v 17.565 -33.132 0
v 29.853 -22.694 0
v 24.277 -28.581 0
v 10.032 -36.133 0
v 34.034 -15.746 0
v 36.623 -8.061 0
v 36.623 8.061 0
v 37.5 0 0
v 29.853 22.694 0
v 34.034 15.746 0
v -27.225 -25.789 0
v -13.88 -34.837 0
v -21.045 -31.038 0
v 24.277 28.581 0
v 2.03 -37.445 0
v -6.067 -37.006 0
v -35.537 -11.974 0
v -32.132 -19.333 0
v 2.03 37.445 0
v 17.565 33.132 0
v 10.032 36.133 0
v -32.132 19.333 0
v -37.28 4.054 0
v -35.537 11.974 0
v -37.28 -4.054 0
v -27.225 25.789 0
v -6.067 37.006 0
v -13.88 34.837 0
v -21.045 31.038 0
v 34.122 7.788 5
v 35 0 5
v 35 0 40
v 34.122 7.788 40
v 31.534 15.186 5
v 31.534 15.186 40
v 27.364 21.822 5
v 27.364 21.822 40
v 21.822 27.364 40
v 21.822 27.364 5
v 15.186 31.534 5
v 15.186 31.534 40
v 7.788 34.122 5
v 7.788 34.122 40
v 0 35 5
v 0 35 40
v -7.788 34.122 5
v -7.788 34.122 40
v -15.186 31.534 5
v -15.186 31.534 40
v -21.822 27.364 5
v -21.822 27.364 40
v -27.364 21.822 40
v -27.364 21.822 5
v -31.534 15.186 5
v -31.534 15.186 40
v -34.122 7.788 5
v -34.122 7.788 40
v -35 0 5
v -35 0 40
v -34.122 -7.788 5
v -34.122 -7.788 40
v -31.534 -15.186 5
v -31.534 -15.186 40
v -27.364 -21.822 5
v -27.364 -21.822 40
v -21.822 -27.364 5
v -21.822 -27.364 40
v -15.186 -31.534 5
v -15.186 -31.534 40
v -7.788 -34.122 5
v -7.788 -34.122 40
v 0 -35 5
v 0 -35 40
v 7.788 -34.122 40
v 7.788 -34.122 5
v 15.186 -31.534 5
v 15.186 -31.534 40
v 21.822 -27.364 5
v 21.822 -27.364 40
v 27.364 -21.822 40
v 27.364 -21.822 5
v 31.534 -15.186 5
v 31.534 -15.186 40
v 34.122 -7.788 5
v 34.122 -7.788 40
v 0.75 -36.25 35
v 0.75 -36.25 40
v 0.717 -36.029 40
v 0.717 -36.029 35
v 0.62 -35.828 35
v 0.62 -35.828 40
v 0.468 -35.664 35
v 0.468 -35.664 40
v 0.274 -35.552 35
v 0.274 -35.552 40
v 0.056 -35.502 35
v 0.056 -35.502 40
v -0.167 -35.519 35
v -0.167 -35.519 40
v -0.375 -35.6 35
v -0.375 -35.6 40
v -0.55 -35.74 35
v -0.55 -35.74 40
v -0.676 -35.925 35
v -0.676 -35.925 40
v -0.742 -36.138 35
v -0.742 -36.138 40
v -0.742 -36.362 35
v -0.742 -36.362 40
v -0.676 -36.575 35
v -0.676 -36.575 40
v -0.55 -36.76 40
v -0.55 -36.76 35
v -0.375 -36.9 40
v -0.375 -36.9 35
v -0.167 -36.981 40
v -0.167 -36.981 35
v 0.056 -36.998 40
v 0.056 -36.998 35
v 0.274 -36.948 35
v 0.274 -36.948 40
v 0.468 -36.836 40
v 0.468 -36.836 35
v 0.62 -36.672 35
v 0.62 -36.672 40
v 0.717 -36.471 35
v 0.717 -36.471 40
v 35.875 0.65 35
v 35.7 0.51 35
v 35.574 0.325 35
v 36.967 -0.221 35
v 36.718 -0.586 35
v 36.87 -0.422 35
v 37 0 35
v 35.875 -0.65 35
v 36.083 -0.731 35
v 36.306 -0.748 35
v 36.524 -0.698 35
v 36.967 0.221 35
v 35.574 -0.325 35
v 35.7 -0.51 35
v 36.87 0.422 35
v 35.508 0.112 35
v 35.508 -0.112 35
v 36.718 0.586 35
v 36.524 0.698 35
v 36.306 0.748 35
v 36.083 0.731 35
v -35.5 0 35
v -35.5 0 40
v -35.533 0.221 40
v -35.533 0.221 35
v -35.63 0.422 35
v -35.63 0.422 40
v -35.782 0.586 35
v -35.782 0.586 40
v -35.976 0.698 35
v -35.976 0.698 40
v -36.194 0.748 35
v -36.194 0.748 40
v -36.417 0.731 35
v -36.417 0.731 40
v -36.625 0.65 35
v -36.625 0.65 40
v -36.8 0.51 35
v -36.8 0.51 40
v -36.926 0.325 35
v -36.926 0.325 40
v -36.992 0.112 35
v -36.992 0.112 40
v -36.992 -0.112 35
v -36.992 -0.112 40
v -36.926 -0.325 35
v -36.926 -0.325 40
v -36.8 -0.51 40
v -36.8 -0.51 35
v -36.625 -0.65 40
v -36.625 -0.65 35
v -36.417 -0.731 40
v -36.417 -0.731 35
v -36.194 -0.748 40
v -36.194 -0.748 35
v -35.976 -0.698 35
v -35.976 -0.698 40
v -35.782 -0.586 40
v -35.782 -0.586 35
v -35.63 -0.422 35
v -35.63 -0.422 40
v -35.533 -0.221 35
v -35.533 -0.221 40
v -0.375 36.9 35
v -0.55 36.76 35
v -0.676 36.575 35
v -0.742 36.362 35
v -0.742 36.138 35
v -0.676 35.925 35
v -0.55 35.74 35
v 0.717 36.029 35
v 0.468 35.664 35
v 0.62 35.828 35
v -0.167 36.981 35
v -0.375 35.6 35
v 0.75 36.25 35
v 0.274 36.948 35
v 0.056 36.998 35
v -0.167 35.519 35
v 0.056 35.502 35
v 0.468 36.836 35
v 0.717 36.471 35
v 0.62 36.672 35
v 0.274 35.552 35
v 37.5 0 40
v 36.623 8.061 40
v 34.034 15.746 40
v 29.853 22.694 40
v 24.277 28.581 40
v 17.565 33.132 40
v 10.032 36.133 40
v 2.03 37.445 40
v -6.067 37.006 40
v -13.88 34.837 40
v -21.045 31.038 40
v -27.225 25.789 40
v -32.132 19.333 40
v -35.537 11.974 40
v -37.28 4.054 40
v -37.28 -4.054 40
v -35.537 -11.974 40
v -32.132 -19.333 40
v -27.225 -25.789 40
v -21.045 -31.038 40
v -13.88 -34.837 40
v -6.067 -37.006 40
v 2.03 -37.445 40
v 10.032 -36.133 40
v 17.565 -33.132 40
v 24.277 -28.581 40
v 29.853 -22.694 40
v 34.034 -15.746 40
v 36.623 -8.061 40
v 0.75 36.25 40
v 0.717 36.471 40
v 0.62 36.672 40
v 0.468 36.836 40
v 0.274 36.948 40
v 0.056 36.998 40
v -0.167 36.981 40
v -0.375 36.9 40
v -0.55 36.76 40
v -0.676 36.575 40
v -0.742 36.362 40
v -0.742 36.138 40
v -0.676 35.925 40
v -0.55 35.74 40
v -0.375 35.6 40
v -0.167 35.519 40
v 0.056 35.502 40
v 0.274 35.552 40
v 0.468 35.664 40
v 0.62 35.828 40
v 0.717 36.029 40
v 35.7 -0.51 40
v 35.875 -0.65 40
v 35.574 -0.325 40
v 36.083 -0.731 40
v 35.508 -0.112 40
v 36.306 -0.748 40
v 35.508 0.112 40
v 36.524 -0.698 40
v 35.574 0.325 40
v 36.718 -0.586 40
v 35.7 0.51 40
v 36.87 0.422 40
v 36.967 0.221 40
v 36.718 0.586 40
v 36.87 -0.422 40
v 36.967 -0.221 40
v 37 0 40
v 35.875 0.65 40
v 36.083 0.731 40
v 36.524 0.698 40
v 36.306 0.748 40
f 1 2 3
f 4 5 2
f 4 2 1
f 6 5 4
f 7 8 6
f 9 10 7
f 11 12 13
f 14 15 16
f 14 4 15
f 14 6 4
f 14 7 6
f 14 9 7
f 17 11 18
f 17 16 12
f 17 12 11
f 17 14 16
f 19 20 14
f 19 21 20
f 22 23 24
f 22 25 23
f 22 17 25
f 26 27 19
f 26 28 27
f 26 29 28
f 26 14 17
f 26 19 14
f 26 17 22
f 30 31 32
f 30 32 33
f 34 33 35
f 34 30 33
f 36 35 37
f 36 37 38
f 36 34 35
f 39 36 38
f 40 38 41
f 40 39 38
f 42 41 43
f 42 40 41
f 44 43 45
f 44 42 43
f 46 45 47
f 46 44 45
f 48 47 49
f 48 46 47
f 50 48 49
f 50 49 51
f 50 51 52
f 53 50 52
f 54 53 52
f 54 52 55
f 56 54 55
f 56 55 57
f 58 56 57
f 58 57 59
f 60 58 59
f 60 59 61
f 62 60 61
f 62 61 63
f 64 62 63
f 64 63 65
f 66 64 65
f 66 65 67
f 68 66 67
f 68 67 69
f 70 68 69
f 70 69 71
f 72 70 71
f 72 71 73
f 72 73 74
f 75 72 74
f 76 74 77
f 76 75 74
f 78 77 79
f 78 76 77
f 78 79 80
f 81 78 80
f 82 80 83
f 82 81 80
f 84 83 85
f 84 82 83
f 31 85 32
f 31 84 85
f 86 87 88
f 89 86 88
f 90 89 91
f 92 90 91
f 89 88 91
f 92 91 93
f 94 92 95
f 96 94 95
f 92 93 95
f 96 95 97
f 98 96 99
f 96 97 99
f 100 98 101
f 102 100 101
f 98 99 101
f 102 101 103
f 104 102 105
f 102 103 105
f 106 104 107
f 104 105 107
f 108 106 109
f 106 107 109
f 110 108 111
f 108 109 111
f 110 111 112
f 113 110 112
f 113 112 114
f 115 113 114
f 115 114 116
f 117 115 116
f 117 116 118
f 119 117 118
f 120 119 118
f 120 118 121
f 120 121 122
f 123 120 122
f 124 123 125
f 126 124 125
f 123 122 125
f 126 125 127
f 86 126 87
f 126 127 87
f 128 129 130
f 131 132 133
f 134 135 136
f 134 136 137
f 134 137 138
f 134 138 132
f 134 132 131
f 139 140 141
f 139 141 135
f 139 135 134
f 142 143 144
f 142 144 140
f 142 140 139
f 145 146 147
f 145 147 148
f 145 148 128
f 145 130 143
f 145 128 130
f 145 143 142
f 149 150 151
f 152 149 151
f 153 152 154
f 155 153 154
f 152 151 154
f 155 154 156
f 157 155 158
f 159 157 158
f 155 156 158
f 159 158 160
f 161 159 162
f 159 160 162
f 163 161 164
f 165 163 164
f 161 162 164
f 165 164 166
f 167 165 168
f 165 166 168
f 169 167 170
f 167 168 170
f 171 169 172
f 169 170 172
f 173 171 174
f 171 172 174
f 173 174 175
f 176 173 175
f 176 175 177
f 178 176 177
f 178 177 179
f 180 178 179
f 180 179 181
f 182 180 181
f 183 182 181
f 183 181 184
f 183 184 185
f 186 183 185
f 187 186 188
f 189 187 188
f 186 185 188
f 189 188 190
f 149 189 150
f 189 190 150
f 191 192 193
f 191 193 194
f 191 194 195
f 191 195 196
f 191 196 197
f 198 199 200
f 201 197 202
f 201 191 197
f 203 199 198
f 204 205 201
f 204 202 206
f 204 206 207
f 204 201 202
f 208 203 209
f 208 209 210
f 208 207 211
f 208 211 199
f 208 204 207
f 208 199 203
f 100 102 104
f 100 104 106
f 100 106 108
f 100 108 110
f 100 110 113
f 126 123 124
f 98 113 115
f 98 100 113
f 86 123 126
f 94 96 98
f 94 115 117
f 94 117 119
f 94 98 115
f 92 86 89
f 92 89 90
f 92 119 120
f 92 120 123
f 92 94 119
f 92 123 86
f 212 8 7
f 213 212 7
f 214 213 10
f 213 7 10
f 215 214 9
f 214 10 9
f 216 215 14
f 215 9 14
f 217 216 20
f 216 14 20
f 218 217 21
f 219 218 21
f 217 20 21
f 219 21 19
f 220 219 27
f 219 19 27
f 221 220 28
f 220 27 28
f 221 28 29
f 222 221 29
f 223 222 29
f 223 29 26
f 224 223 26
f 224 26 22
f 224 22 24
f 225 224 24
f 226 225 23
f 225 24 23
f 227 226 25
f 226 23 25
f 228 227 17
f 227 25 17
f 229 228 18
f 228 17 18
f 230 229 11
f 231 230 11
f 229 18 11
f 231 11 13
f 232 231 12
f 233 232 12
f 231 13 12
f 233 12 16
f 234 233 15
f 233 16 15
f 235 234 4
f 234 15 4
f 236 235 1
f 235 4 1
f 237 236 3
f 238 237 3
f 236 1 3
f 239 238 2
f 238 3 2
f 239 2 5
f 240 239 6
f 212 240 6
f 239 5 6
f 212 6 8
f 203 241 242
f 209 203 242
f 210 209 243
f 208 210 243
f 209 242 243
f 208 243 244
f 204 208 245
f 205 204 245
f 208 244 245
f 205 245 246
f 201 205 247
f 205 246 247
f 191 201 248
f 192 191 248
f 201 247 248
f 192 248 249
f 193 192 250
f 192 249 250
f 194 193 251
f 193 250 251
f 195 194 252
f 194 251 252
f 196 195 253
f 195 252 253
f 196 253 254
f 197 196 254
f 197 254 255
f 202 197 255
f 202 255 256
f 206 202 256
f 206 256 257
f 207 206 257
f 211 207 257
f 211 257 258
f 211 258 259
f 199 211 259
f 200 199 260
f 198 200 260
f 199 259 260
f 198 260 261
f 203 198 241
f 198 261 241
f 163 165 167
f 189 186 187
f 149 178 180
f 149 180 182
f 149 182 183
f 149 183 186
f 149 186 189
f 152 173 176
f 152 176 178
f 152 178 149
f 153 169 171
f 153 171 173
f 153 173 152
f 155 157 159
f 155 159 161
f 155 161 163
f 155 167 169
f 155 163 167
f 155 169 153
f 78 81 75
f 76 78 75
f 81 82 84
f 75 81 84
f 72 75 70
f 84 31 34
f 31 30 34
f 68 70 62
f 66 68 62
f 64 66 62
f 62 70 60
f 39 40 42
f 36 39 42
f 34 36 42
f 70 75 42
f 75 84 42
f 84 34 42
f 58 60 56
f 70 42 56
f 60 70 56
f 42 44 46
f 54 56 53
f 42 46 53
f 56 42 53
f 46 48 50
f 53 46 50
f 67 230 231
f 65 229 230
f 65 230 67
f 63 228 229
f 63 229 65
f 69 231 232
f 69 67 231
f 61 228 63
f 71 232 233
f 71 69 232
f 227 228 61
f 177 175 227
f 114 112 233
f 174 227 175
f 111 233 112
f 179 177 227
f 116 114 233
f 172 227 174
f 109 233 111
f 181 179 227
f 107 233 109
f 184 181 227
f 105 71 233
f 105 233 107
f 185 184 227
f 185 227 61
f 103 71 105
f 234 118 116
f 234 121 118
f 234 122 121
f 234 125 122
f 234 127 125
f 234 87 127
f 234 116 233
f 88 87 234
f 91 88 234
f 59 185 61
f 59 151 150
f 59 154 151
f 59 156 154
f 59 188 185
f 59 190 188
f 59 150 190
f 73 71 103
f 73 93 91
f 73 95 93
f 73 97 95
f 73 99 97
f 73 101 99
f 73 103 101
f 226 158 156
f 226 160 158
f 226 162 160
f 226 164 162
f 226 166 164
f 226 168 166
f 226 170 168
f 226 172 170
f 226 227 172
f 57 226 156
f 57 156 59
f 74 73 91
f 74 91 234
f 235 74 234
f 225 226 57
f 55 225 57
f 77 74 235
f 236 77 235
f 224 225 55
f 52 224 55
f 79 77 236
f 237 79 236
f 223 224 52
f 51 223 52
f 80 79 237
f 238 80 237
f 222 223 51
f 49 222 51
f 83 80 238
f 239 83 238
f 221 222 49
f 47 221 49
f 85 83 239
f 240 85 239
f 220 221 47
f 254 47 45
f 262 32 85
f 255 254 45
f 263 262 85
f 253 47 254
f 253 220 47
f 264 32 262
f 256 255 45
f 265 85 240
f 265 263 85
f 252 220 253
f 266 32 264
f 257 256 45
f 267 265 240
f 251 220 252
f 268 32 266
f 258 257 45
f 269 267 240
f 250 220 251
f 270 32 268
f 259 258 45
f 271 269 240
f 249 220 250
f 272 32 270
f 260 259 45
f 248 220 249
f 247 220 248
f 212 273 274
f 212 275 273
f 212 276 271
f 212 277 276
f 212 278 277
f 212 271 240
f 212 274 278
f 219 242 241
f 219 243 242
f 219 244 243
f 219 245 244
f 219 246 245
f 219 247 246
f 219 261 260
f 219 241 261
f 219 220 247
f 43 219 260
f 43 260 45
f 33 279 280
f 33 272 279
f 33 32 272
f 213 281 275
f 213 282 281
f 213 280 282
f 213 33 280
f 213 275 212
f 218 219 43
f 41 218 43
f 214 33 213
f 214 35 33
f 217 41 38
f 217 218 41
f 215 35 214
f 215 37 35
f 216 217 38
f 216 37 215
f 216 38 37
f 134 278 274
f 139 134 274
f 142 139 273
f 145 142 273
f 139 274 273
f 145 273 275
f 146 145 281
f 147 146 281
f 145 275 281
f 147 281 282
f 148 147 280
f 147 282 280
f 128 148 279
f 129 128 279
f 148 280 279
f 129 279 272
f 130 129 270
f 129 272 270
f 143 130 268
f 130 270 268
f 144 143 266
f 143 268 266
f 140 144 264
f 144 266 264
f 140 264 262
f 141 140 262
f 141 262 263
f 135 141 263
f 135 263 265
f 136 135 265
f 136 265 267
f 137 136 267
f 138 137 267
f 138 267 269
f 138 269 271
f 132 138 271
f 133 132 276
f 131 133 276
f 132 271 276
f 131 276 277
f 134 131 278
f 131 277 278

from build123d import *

# Parameters (mm, degrees)
SKETCH1_R           = 37.5
SKETCH1_R_2         = 35
BOSS_EXTRUDE1_DEPTH = 40
SKETCH2_R           = 35
BOSS_EXTRUDE2_DEPTH = 5
SKETCH3_R           = 0.75
CUT_EXTRUDE1_DEPTH  = 5


with BuildPart() as part:
    # Sketch1 → Boss-Extrude1 (new body)
    with BuildSketch(Plane.XY):
        Circle(SKETCH1_R)
        Circle(SKETCH1_R_2, mode=Mode.SUBTRACT)
    extrude(amount=BOSS_EXTRUDE1_DEPTH)

    # Sketch2 → Boss-Extrude2 (add)
    with BuildSketch(Plane(origin=(0, 0, 0), x_dir=(-1, 0, 0), z_dir=(0, 0, -1))):
        Circle(SKETCH2_R)
    extrude(amount=-BOSS_EXTRUDE2_DEPTH)

    # Sketch3 → Cut-Extrude1 (cut)
    with BuildSketch(Plane.XY.offset(40)):
        with Locations((0, 36.25)):
            Circle(SKETCH3_R)
        with Locations((36.25, 0)):
            Circle(SKETCH3_R)
        with Locations((0, -36.25)):
            Circle(SKETCH3_R)
        with Locations((-36.25, 0)):
            Circle(SKETCH3_R)
    extrude(amount=-CUT_EXTRUDE1_DEPTH, mode=Mode.SUBTRACT)


solid = part.part
